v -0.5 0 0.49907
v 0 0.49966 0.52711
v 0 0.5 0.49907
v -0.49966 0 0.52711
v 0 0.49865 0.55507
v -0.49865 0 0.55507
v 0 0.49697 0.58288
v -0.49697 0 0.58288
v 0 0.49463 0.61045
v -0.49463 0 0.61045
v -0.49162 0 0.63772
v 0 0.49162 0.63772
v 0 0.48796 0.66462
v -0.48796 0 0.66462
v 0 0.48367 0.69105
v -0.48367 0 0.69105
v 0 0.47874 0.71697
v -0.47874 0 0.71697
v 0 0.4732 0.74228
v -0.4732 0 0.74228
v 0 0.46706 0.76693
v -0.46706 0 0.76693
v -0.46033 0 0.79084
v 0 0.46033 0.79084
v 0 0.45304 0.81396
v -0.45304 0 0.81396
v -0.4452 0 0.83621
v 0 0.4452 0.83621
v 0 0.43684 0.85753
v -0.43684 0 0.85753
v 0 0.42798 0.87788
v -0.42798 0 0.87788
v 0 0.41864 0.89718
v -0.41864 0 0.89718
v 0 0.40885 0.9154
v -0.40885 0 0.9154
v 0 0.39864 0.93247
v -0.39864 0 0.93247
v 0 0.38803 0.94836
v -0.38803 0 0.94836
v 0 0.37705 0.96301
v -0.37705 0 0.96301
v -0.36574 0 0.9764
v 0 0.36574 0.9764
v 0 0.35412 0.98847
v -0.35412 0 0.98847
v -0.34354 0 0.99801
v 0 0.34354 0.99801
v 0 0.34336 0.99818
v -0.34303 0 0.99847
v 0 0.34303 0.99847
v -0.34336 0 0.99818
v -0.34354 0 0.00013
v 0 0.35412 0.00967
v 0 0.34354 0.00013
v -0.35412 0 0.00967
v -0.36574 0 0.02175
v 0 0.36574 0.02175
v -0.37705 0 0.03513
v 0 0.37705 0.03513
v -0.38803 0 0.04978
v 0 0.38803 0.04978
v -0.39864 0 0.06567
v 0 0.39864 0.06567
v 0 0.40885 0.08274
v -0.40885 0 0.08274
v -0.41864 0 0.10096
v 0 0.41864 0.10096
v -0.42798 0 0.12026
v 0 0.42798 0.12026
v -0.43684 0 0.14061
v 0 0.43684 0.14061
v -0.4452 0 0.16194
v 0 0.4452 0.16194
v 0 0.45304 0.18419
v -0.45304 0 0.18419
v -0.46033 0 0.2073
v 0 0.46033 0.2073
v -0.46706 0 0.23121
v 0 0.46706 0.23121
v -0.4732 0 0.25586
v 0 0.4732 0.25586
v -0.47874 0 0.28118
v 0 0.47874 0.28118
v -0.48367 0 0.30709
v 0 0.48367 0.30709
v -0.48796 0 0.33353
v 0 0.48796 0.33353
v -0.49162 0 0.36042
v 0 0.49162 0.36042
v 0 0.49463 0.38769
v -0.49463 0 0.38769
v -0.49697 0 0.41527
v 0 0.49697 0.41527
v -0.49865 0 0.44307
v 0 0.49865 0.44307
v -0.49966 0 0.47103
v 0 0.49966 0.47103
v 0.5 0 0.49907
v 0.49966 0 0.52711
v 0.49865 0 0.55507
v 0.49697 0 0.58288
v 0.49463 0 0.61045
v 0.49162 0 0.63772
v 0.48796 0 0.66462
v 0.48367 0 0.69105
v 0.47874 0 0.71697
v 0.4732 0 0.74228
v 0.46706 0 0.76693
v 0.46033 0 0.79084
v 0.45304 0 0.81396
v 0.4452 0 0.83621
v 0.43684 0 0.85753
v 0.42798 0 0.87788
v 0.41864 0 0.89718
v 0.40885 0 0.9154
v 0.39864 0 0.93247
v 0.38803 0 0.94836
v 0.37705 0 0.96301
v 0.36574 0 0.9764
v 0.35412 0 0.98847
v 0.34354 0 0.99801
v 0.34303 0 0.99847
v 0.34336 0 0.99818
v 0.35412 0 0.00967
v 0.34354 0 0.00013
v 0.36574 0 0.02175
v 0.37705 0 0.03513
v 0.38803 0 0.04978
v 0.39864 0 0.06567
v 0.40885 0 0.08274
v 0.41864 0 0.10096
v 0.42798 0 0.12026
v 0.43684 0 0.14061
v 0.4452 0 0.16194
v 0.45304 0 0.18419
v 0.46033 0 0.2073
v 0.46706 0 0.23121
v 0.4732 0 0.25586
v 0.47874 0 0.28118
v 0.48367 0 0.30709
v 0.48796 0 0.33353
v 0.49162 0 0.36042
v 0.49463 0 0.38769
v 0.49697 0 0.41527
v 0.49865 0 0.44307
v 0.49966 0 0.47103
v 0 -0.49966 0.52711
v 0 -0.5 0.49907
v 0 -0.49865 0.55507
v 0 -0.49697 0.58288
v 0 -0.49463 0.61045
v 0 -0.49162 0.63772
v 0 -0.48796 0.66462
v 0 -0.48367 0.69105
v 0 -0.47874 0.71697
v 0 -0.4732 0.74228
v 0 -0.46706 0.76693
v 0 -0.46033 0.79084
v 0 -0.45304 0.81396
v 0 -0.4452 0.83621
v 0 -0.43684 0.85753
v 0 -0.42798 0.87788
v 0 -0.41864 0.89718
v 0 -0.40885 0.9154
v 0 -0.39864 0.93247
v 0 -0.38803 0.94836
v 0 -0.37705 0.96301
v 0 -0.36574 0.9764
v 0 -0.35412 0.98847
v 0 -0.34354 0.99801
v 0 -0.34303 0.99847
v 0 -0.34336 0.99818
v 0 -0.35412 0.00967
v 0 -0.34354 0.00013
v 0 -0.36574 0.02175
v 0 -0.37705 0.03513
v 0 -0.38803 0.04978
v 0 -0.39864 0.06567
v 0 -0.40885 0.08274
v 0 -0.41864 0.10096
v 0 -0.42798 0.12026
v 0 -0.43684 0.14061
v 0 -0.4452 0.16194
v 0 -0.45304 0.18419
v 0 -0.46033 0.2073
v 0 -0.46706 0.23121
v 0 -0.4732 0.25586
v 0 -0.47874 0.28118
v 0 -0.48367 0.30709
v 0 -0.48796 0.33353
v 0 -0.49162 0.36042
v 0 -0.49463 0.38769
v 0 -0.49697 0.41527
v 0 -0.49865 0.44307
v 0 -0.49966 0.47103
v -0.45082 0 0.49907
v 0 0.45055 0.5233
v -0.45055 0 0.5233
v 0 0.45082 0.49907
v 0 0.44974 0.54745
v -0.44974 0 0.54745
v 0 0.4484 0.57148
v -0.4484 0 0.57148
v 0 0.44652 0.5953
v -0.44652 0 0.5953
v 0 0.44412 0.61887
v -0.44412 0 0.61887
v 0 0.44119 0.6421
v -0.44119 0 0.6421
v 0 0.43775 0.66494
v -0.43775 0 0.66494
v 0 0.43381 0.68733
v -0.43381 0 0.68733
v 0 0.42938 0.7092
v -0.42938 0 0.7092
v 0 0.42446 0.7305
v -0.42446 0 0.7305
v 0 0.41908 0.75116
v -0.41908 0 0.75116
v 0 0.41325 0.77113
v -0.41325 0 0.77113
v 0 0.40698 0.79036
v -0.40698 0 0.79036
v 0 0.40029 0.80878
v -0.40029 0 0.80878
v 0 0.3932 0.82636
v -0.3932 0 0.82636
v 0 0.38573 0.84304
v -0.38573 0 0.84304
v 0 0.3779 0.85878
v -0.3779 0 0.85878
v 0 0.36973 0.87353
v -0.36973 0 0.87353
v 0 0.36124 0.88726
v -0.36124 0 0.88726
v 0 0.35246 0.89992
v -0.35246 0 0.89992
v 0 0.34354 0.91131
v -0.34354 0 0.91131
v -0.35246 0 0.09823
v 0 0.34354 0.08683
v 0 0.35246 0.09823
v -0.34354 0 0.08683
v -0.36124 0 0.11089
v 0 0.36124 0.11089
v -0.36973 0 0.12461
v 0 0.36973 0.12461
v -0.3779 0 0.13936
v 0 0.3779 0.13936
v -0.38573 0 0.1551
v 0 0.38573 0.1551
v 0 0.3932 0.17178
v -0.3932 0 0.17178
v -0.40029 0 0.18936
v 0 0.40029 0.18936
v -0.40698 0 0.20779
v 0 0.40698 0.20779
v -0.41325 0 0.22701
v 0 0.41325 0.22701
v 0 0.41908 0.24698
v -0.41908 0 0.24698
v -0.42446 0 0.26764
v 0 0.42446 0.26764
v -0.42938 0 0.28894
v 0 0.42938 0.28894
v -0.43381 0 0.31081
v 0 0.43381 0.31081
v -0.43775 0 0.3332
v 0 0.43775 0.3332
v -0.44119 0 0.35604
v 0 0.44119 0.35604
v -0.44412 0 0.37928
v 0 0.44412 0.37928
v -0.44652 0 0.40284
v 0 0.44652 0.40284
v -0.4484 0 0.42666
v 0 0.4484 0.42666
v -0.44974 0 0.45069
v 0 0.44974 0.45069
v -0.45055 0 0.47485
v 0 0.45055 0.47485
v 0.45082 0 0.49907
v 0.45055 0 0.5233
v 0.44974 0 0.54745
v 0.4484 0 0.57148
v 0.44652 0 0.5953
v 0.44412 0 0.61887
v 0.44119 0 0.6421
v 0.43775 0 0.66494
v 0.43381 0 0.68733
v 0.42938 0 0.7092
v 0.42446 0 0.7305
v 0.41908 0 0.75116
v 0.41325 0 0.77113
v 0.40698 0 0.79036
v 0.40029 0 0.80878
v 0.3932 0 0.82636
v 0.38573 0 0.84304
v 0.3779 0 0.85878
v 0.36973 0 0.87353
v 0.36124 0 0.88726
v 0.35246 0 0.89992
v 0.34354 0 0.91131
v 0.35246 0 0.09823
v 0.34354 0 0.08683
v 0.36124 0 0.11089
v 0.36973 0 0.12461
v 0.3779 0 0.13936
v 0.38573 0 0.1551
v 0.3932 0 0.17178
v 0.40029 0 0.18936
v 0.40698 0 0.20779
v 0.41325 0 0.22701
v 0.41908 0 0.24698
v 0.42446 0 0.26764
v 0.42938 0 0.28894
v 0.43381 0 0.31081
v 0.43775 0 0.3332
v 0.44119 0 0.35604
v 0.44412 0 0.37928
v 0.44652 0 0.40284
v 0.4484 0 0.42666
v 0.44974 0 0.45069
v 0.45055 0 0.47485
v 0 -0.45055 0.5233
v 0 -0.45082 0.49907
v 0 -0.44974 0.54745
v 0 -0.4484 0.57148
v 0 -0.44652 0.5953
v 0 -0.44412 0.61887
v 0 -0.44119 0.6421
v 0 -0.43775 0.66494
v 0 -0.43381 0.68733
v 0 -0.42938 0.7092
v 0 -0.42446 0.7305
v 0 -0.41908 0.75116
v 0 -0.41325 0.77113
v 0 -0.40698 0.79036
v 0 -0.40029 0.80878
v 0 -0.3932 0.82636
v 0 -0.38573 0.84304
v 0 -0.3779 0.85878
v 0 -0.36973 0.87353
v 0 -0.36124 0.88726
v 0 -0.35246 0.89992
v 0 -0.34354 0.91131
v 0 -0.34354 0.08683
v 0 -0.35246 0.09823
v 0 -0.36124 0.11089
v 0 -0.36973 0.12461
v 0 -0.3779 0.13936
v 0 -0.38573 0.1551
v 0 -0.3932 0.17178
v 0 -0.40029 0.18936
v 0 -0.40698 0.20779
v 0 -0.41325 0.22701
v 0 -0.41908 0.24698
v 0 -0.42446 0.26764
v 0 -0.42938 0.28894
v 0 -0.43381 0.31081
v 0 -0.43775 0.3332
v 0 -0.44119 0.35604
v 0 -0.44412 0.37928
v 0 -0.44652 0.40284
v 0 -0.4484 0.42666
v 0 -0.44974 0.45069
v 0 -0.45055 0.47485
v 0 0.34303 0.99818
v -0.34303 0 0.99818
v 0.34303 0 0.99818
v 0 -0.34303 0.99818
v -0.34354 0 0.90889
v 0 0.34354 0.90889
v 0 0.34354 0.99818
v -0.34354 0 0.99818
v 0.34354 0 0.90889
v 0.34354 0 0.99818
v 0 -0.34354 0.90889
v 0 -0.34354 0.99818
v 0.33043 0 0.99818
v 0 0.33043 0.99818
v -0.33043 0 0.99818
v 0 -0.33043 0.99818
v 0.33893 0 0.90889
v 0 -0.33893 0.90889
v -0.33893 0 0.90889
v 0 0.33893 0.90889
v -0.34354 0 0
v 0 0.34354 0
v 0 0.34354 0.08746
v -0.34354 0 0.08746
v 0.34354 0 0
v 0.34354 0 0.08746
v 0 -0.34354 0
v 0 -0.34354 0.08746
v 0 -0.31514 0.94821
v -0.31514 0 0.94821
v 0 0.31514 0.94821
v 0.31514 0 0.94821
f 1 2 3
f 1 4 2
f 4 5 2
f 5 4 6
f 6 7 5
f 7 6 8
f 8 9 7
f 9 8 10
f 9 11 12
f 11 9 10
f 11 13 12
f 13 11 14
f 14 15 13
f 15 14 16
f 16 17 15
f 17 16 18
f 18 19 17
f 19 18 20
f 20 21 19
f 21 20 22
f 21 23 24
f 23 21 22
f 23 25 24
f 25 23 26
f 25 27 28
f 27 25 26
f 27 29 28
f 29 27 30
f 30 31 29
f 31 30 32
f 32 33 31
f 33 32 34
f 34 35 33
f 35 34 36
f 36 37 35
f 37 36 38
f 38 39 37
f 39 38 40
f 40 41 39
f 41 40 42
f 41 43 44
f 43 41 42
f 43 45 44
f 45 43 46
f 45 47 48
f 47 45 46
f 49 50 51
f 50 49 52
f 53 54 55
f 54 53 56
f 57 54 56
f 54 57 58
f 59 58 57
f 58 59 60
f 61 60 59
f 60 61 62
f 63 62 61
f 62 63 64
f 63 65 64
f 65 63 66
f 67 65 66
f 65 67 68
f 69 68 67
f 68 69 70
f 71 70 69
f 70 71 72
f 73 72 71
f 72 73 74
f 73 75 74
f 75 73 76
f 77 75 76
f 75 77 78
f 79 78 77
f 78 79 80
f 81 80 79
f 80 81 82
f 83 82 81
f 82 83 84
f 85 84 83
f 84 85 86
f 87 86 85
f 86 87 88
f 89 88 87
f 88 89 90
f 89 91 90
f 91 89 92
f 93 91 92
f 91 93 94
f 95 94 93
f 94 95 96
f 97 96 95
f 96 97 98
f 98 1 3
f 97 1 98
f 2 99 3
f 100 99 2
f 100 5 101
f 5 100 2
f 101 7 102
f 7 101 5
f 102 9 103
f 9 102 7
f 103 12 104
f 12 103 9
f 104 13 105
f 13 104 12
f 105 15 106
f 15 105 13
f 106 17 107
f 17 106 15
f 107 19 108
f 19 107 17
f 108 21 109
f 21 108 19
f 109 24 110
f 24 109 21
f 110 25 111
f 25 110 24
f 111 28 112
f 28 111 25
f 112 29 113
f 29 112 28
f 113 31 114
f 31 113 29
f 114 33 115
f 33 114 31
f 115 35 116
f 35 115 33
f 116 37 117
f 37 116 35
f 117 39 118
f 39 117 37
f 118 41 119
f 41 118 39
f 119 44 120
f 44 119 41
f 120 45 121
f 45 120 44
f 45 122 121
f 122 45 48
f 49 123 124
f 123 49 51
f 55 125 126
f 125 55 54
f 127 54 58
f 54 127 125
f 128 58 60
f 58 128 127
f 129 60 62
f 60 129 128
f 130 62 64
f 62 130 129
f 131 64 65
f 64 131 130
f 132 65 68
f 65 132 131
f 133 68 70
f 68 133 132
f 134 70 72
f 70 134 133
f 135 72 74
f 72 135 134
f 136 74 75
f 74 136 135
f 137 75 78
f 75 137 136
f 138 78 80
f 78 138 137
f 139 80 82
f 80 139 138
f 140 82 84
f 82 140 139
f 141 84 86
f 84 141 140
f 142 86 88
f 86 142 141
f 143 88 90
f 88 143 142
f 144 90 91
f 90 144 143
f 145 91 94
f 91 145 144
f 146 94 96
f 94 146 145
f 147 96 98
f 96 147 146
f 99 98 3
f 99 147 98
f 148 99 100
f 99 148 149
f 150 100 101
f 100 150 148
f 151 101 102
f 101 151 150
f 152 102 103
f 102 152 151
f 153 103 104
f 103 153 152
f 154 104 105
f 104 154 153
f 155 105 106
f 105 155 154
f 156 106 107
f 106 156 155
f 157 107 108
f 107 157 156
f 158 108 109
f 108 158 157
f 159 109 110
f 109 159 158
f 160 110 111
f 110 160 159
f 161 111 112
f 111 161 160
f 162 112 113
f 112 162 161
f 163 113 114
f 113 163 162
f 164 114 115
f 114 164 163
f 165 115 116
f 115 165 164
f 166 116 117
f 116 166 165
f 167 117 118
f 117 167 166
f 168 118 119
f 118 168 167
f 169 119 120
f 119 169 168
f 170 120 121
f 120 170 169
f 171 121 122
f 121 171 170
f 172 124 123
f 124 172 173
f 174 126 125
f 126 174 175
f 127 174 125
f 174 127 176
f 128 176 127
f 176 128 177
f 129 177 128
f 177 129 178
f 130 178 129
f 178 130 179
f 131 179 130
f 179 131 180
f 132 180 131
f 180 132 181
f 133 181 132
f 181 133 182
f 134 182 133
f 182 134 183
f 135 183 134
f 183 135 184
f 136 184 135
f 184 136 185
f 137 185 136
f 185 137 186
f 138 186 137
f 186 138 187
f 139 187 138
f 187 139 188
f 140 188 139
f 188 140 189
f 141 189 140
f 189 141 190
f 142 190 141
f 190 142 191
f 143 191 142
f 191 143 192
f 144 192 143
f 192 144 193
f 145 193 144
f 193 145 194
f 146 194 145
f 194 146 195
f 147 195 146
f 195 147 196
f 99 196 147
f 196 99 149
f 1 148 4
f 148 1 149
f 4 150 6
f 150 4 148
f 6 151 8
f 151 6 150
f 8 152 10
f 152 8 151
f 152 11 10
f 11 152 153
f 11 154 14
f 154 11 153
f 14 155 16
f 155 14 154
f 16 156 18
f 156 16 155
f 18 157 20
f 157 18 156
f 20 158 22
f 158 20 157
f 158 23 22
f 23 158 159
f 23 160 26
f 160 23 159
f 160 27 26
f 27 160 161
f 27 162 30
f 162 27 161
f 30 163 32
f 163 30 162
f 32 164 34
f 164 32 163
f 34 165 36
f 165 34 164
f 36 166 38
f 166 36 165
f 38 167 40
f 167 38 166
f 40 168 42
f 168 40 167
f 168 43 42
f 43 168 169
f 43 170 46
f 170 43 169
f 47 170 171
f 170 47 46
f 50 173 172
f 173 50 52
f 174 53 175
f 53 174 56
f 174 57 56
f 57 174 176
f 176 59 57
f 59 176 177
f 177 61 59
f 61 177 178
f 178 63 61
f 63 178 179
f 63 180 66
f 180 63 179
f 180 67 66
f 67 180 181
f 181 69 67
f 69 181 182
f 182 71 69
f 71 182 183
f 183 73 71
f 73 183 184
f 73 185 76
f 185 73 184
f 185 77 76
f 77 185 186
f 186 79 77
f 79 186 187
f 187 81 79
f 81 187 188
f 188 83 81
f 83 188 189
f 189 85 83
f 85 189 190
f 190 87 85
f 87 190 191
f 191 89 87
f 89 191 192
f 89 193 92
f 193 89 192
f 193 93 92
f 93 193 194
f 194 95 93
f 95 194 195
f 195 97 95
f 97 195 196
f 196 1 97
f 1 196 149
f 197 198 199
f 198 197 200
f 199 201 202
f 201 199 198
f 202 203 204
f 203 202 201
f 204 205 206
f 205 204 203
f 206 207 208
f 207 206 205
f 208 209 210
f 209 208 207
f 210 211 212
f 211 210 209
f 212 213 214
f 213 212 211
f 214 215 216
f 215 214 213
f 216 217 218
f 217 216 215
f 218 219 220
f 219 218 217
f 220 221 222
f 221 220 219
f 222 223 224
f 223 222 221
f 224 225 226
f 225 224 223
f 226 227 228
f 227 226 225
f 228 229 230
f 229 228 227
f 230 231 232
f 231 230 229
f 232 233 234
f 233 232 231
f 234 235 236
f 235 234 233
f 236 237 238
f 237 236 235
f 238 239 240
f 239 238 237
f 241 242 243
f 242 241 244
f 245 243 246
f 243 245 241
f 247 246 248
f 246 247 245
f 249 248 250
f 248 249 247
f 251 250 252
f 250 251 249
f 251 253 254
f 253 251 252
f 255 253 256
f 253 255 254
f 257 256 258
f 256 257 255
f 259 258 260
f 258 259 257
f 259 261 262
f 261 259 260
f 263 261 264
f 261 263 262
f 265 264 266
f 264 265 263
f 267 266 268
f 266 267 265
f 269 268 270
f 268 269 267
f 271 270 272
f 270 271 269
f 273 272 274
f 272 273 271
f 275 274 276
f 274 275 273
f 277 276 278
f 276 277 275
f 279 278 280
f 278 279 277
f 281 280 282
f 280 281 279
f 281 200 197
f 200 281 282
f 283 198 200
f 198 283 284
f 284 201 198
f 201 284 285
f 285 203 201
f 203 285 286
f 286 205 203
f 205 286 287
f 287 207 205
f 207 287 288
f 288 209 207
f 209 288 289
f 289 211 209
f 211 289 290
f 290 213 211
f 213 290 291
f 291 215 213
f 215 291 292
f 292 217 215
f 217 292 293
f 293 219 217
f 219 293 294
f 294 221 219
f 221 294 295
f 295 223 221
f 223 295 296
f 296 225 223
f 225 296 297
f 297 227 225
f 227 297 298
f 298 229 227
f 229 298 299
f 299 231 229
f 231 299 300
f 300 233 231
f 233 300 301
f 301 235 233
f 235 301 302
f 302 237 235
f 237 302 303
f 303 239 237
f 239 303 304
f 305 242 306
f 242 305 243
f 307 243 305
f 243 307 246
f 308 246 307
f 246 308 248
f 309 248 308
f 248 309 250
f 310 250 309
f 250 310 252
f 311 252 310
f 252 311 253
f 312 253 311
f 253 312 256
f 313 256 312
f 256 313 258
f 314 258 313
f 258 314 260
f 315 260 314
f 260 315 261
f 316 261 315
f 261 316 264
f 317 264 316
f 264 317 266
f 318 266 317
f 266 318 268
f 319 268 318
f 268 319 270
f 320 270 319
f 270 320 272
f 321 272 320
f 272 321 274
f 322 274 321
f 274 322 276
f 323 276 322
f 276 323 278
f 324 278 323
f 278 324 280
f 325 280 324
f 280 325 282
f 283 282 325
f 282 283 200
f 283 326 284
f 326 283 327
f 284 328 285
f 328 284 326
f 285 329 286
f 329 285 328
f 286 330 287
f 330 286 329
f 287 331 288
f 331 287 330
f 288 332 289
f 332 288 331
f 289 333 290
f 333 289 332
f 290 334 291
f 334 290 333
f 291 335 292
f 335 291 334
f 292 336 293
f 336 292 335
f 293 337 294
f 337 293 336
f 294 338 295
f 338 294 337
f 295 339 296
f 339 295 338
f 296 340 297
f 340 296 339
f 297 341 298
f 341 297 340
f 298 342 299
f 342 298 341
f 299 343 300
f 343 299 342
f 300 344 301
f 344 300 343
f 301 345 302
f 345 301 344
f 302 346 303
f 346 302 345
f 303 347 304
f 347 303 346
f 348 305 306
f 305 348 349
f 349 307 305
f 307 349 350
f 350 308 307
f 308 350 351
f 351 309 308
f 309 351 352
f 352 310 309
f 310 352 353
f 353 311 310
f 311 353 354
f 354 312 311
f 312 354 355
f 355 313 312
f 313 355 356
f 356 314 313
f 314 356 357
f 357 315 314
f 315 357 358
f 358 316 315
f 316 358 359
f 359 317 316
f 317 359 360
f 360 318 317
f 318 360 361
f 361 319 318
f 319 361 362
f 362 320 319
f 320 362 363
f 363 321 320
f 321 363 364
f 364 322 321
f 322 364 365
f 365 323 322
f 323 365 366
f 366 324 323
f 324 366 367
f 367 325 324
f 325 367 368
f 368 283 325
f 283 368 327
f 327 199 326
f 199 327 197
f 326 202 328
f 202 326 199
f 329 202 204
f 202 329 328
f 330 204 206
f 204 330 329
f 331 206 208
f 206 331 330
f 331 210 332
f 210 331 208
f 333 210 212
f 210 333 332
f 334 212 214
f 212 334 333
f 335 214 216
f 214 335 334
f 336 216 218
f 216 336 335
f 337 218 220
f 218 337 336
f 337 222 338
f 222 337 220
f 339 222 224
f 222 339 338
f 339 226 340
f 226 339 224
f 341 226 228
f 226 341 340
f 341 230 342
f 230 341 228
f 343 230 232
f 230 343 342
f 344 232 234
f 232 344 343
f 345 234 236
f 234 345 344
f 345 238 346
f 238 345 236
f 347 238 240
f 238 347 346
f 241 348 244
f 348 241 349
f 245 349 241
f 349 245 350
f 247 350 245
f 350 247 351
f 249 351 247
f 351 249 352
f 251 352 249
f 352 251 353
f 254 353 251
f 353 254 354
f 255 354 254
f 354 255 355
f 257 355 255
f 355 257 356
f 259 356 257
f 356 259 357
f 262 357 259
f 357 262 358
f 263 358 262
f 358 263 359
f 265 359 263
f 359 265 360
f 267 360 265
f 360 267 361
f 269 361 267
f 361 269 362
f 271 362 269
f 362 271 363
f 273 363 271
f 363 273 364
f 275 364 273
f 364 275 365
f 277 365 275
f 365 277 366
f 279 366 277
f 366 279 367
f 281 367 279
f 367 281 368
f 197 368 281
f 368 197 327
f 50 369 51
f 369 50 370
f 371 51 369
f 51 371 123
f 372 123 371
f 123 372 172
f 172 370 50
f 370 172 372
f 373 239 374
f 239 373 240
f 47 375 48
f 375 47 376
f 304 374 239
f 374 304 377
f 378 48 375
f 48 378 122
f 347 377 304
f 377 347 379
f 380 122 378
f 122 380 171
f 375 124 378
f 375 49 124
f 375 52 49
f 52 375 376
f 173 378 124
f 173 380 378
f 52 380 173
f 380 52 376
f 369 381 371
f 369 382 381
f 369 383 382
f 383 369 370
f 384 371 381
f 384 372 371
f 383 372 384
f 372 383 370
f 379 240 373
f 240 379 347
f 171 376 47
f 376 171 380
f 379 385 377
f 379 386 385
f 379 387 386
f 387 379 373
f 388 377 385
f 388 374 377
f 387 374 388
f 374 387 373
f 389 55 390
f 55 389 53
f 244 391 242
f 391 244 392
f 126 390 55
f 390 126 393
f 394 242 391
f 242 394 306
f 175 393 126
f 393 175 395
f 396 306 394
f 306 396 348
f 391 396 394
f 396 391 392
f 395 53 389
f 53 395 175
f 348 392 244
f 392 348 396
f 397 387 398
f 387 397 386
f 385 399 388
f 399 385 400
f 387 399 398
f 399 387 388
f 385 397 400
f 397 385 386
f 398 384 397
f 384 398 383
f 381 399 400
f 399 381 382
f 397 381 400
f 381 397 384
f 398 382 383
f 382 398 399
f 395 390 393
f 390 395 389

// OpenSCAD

// The shape of pot you'd like
potShape = 0; // [0:14]

// The number of sides (0 for Cylindrical)
numberSides = 4; // [0:100]

drawReceptacle(potShape,numberSides);

module hSphere(r=1,t=0.1,ns,rot) {
	difference() {
		sphere(r);
		sphere(r-t);
	}
}

rotationList=[0,0,0,60,0,-36,60,180/7,0,-20,36,180/11,0,-180/13,180/7,12,0,0,0,0,0,0];

module drawReceptacle(number,sides) {
	ns=(sides<3)?100:sides;
	rotby=(ns>20)?0:rotationList[ns];

		if (number==1) { receptacle3(ns,rotby);
	} else if (number==2) { receptacle1(ns,rotby);
	} else if (number==3) { receptacle2(ns,rotby);
	} else if (number==4) { receptacle5(ns,rotby);
	} else if (number==5) { receptacle6(ns,rotby);
	} else if (number==6) { receptacle7(ns,rotby);
	} else if (number==7) { receptacle4(ns,rotby);
	} else if (number==8) { receptacle8(ns,rotby);
	} else if (number==9) { receptacle9(ns,rotby);
	} else if (number==10) { receptacle10(ns,rotby);
	} else if (number==11) { receptacle11(ns,rotby);
	} else if (number==12) { receptacle14(ns,rotby);
	} else if (number==13) { receptacle12(ns,rotby);
	} else if (number==14) { receptacle13(ns,rotby);
	} else { 
		 receptacle0(ns,rotby);
	}	
}

diameter=50;
height=100;
quality=120;
$fn=quality;
numbsides=100; rotation=0;


module hSphere(r=1,t=0.1,ns,rot) {
	difference() {
		sphere(r);
		sphere(r-t);
	}
}
module hTorus(r=1,t=0.1,ns,rot) {
	scale([1,1,2])difference() {
		rotate([0,0,rot]) rotate_extrude(convexity=15,$fn=ns) translate([r*2/3, 0, 0]) circle(r/3,$fn=quality); 
		rotate([0,0,rot]) scale([1,1,1.2])rotate_extrude(convexity=15,$fn=ns) translate([r*2/3, 0, 0]) circle(r/3-t,$fn=quality); 
	}
}
module nTorus(r=1,t=0.1,ns,rot) {
	scale([1,1,2])difference() {
		rotate([0,0,rot]) rotate_extrude(convexity=15,$fn=ns) translate([r*2/3, 0, 0]) circle(r/3,$fn=quality); 
		rotate([0,0,rot]) scale([1,1,1.1])rotate_extrude(convexity=15,$fn=ns) translate([r*2/3, 0, 0]) circle(r/3-t,$fn=quality); 
	}
}

module receptacle0(ns,rot) {
	intersection() { translate([0,0,0.5])cube(1,center=true);
		scale([1/122,1/122,1/112])translate([0,0,-2.64])difference() {
			scale([1,1,2]) translate([0,0,((30+6)*2*0.813)/2]) union() {
				difference() {
					rotate([0,0,rot]) { rotate_extrude(convexity = 10,$fn=ns) translate([31, 0, 0]) circle(30,$fn=quality);  }
					rotate([0,0,rot]) { scale([1,1,1.08]) rotate_extrude(convexity = 10,$fn=ns) translate([31, 0, 0]) circle(24,$fn=quality); }
					cylinder(31*2.5,31*1.35,31*1.35,center=true,$fn=ns);
				}
				translate([0,0,22.95])cylinder(5,31*1.352,31*1.352,$fn=ns);
				translate([0,0,0-27.95])cylinder(4.9,31*1.352,31*1.352,$fn=ns);
			}
			translate([0,0,108])cylinder(9.1,42,36,center=true,$fn=ns);
			translate([0,0,112])cylinder(9,38,41,center=true,$fn=ns);
		}
	}
}
module receptacle1(ns,rot) {
	intersection() { translate([0,0,0.5])cube(1,center=true);
		scale([1/2,1/2,1/2])translate([0,0,0.5]) union() {
			difference() {
				hTorus(1,0.1,ns,rot);
				cylinder(1.8,0.83,0.83,center=true,$fn=ns);
			}
			scale([1.67,1.67,1]) translate([0,0,-0.5275]) cylinder(0.1,0.498,0.498,center=true,$fn=ns);
		
			difference() {
				union() {
					scale([1.67,1.67,1]) translate([0,0,0.96])  {
						intersection() {
							hTorus(1,0.1,ns,rot);
							cylinder(1.5,0.5,0.5,center=true,$fn=ns);
						}
					}
					rotate([0,0,rot]) translate([0,0,1.442])rotate_extrude(convexity = 10,$fn=ns) translate([0.83, 0, 0]) scale([0.4,1,1])circle(0.1,$fn=quality); 
				}
				union() {
					translate([0,0,0.6])cylinder(0.5,0.85,0.61,center=true,$fn=ns);
					translate([0,0,0.05])cylinder(0.6,0.85,0.85,center=true,$fn=ns);
				}
			}
		}
	}
}
module receptacle2(ns,rot) {
	intersection() { translate([0,0,0.5])cube(1,center=true);
		scale([1/2,1/2,1/3])translate([0,0,0.5]) union() {
			difference() {
				hTorus(1,0.1,ns,rot);
				cylinder(1.8,0.83,0.83,center=true,$fn=ns);
			}
			scale([1.67,1.67,1]) translate([0,0,-0.5275]) cylinder(0.1,0.498,0.498,center=true,$fn=ns);
		
			difference() {
				scale([1,1,2]) union() {
					scale([1.67,1.67,1]) translate([0,0,0.96+((2-1)*-0.29)])  {
						intersection() {
							hTorus(1,0.1,ns,rot);
							cylinder(1.5,0.5,0.5,center=true,$fn=ns);
						}
					}
					rotate([0,0,rot]) translate([0,0,1.442+((2-1)*-0.29)])rotate_extrude(convexity = 10,$fn=ns) translate([0.83, 0, 0]) scale([0.4,1,1])circle(0.1,$fn=quality); 
				}
				union() {
					translate([0,0,0.6])cylinder(0.5,0.85,0.61,center=true,$fn=ns);
					translate([0,0,0.05])cylinder(0.6,0.85,0.85,center=true,$fn=ns);
				}
			}
		}
	}
}
module receptacle3(ns,rot) {
	intersection() { translate([0,0,0.5])cube(1,center=true);
		scale([1/2,1/2,1/1.75])translate([0,0,0.5]) union() {
			difference() {
				hTorus(1,0.1,ns,rot);
				cylinder(1.8,0.83,0.83,center=true,$fn=ns);
			}
			scale([1.67,1.67,1]) translate([0,0,-0.5275]) cylinder(0.1,0.498,0.498,center=true,$fn=ns);
		
			difference() {
				scale([1,1,0.7]) union() {
					scale([1.67,1.67,1]) translate([0,0,1.215])  {
						intersection() {
							hTorus(1,0.1,ns,rot);
							cylinder(1.5,0.5,0.5,center=true,$fn=ns);
						}
					}
					rotate([0,0,rot]) translate([0,0,1.697])rotate_extrude(convexity = 10,$fn=ns) translate([0.83, 0, 0]) scale([0.4,1,1])circle(0.1,$fn=quality); 
				}
				union() {
					translate([0,0,0.6])cylinder(0.5,0.85,0.61,center=true,$fn=ns);
					translate([0,0,0.05])cylinder(0.6,0.85,0.85,center=true,$fn=ns);
				}
			}
		}
	}
}
module receptacle4(ns,rot) {
	intersection() {
		scale([0.5,0.5,0.47])translate([0,0,0.57]) union() {
			difference() {
				hTorus(1,0.1,ns,rot);
				translate([0,0,-1.38])cylinder(1.8,0.83,0.83,center=true,$fn=ns);
				cylinder(1.8,0.65,0.65,center=true,$fn=ns);
				translate([0,0,0.5])cylinder(1,1.1,1.1,center=true,$fn=ns);
			}
			scale([1.67,1.67,1]) translate([0,0,-0.5275]) cylinder(0.1,0.498,0.498,center=true,$fn=ns);
			translate([0,0,0.75])difference() {
				cylinder(1.5,1,1,center=true,$fn=ns);
				cylinder(2,0.9,0.9,center=true,$fn=ns);
			}
			rotate([0,0,rot]) translate([0,0,1.5])rotate_extrude(convexity = 10,$fn=ns) translate([0.95, 0, 0]) circle(0.05,$fn=quality); 
		}
		translate([0,0,0.5]) cube(1,center=true);
	}
}
module receptacle5(ns,rot) {
	intersection() {
		scale([0.39,0.39,0.445])translate([0,0,0.5752]) union() {
			difference() {
				hTorus(1,0.1,ns,rot);
				translate([0,0,-1.38])cylinder(1.8,0.83,0.83,center=true,$fn=ns);
				cylinder(1.8,0.65,0.65,center=true,$fn=ns);
				translate([0,0,0.5])cylinder(1,1.1,1.1,center=true,$fn=ns);
			}
			scale([1.67,1.67,1]) translate([0,0,-0.5275]) cylinder(0.1,0.498,0.498,center=true,$fn=ns);
			translate([0,0,0.5])difference() {
				cylinder(1,1,1,center=true,$fn=ns);
				cylinder(2,0.9,0.9,center=true,$fn=ns);
			}
			rotate([0,0,rot]) translate([0,0,1.61])rotate_extrude(convexity = 10,$fn=ns) translate([1.24, 0, 0]) scale([1,3,1])circle(0.025,$fn=quality); 
			scale([2.515,2.515,2])translate([0,0,0.25]) intersection() {
					nTorus(1,0.041,ns,rot);
					cylinder(1.5,0.5,0.5,center=true,$fn=ns);
					translate([0,0,0.5])cylinder(0.5,1,1,center=true,$fn=ns);
				}
		}
		translate([0,0,0.5]) cube(1,center=true);
	}
}
module receptacle6(ns,rot) {
	intersection() {
		scale([0.39,0.39,0.57])translate([0,0,0.5752]) union() {
			difference() {
				hTorus(1,0.1,ns,rot);
				translate([0,0,-1.38])cylinder(1.8,0.83,0.83,center=true,$fn=ns);
				cylinder(1.8,0.65,0.65,center=true,$fn=ns);
				translate([0,0,0.5])cylinder(1,1.1,1.1,center=true,$fn=ns);
			}
			scale([1.67,1.67,1]) translate([0,0,-0.5275]) cylinder(0.1,0.498,0.498,center=true,$fn=ns);
			translate([0,0,0.25])difference() {
				cylinder(0.5,1,1,center=true,$fn=ns);
				cylinder(2,0.9,0.9,center=true,$fn=ns);
			}
			rotate([0,0,rot]) translate([0,0,1.11])rotate_extrude(convexity = 10,$fn=ns) translate([1.24, 0, 0]) scale([1,3,1])circle(0.025,$fn=quality); 
			scale([2.515,2.515,2])translate([0,0,0]) intersection() {
					nTorus(1,0.041,ns,rot);
					cylinder(1.5,0.5,0.5,center=true,$fn=ns);
					translate([0,0,0.5])cylinder(0.5,1,1,center=true,$fn=ns);
				}
		}
		translate([0,0,0.5]) cube(1,center=true);
	}
}
module receptacle7(ns,rot) {
	intersection() {
		scale([0.39,0.39,0.8])translate([0,0,0.5752]) union() {
			difference() {
				hTorus(1,0.1,ns,rot);
				translate([0,0,-1.38])cylinder(1.8,0.83,0.83,center=true,$fn=ns);
				cylinder(1.8,0.65,0.65,center=true,$fn=ns);
				translate([0,0,0.5])cylinder(1,1.1,1.1,center=true,$fn=ns);
			}
			scale([1.67,1.67,1]) translate([0,0,-0.5275]) cylinder(0.1,0.498,0.498,center=true,$fn=ns);
			rotate([0,0,rot]) translate([0,0,0.61])rotate_extrude(convexity = 10,$fn=ns) translate([1.24, 0, 0]) scale([1,3,1])circle(0.025,$fn=quality); 
			scale([2.515,2.515,2])translate([0,0,-0.25]) intersection() {
					nTorus(1,0.041,ns,rot);
					cylinder(1.5,0.5,0.5,center=true,$fn=ns);
					translate([0,0,0.5])cylinder(0.5,1,1,center=true,$fn=ns);
				}
		}
		translate([0,0,0.5]) cube(1,center=true);
	}
}
module receptacle8(ns,rot) {
	intersection() {
		scale([0.5,0.5,0.48])translate([0,0,0.5]) union() {
			translate([0,0,0.25])difference() {
				cylinder(1.5,1,1,center=true,$fn=ns);
				cylinder(2,0.9,0.9,center=true,$fn=ns);
			}
			translate([0,0,-0.45]) cylinder(0.1,1,1,center=true,$fn=ns);
			translate([0,0,1])rotate([180,0,0])difference() {
				hTorus(1,0.1,ns,rot);
				translate([0,0,-1.25])cylinder(1.8,0.83,0.83,center=true,$fn=ns);
				cylinder(1.8,0.65,0.65,center=true,$fn=ns);
				translate([0,0,0.5])cylinder(1,1.1,1.1,center=true,$fn=ns);
			}
			rotate([0,0,rot]) translate([0,0,1.493])rotate_extrude(convexity = 10,$fn=ns) translate([0.83, 0, 0]) scale([1,3.5,1])circle(0.025,$fn=quality); 
		}
		translate([0,0,0.5]) cube(1,center=true);
	}
}

module receptacle9(ns,rot) {
	intersection() {
		scale([0.5,0.5,0.48])translate([0,0,0.5]) union() {
			translate([0,0,0.25])difference() {
				cylinder(2.5,1,1,center=true,$fn=ns);
				cylinder(2.6,0.9,0.9,center=true,$fn=ns);
			}
			translate([0,0,-0.45]) cylinder(0.1,1,1,center=true,$fn=ns);
			rotate([0,0,rot]) translate([0,0,1.5])rotate_extrude(convexity = 10,$fn=ns) translate([0.95, 0, 0]) circle(0.05,$fn=quality); 
		}
		translate([0,0,0.5]) cube(1,center=true);
	}
}

module receptacle10(ns,rot) {
	intersection() {
		scale([0.5,0.5,0.48])translate([0,0,0.5]) union() {
			scale([2,2,2])translate([0,0,0.25]) intersection() {
					nTorus(1,0.041,ns,rot);
					cylinder(1.5,0.5,0.5,center=true,$fn=ns);
					translate([0,0,0.5])cylinder(0.5,1,1,center=true,$fn=ns);
				}
			translate([0,0,0.25])difference() {
				cylinder(1.5,0.795,0.795,center=true,$fn=ns);
				cylinder(2.1,0.717,0.717,center=true,$fn=ns);
			}
			translate([0,0,-0.45]) cylinder(0.1,0.795,0.795,center=true,$fn=ns);
		}
		translate([0,0,0.5]) cube(1,center=true);
	}
}
module receptacle11(ns,rot) {
	intersection() {
		scale([0.5,0.5,0.48])translate([0,0,0.5]) union() {
			scale([2,2,2])translate([0,0,0.25]) intersection() {
					nTorus(1,0.041,ns,rot);
					cylinder(1.5,0.5,0.5,center=true,$fn=ns);
					translate([0,0,-0.5])cylinder(0.5,1,1,center=true,$fn=ns);
				}
			translate([0,0,0.75])difference() {
				cylinder(1.5,0.795,0.795,center=true,$fn=ns);
				cylinder(2.1,0.717,0.717,center=true,$fn=ns);
			}
			translate([0,0,-0.45]) cylinder(0.1,0.95,0.9,center=true,$fn=ns);
			rotate([0,0,rot]) translate([0,0,1.5])rotate_extrude(convexity = 10,$fn=ns) translate([0.76, 0, 0]) circle(0.035,$fn=quality); 
		}
		translate([0,0,0.5]) cube(1,center=true);
	}
}
module receptacle12(ns,rot) {
	intersection() {
		scale([0.5,0.5,0.48])translate([0,0,0.5]) union() {
			translate([0,0,0.25])difference() {
				cylinder(2.5,0.5,1,center=true,$fn=ns);
				cylinder(2.6,0.4,0.9,center=true,$fn=ns);
			}
			translate([0,0,-0.45]) cylinder(0.1,0.55,0.55,center=true,$fn=ns);
			rotate([0,0,rot]) translate([0,0,1.5])rotate_extrude(convexity = 10,$fn=ns) translate([0.947, 0, 0]) circle(0.052,$fn=quality); 
		}
		translate([0,0,0.5]) cube(1,center=true);
	}
}
module receptacle13(ns,rot) {
	intersection() {
		scale([0.5,0.5,0.48])translate([0,0,0.5]) union() {
			translate([0,0,0.25])difference() {
				cylinder(2.5,1,0.6,center=true,$fn=ns);
				cylinder(2.6,0.9,0.5,center=true,$fn=ns);
			}
			translate([0,0,-0.45]) cylinder(0.1,0.9,0.9,center=true,$fn=ns);
			rotate([0,0,rot]) translate([0,0,1.5])rotate_extrude(convexity = 10,$fn=ns) translate([0.554, 0, 0]) circle(0.045,$fn=quality); 
		}
		translate([0,0,0.5]) cube(1,center=true);
	}
}

module receptacle14(ns,rot) {
	intersection() {
		scale([0.5,0.5,0.48])translate([0,0,0.5]) union() {
			scale([2,2,2])translate([0,0,0.25]) intersection() {
					nTorus(1,0.041,ns,rot);
					cylinder(1.5,0.5,0.5,center=true,$fn=ns);
					translate([0,0,0.5])cylinder(0.5,1,1,center=true,$fn=ns);
				}
			translate([0,0,0.5])difference() {
				cylinder(1,0.795,0.795,center=true,$fn=ns);
				cylinder(2.1,0.717,0.717,center=true,$fn=ns);
			}
			scale([2,2,2])translate([0,0,0.25]) intersection() {
					nTorus(1,0.041,ns,rot);
					cylinder(1.5,0.5,0.5,center=true,$fn=ns);
					translate([0,0,-0.5])cylinder(0.5,1,1,center=true,$fn=ns);
				}
			translate([0,0,-0.45]) cylinder(0.1,0.95,0.9,center=true,$fn=ns);
		}
		translate([0,0,0.5]) cube(1,center=true);
	}
}
